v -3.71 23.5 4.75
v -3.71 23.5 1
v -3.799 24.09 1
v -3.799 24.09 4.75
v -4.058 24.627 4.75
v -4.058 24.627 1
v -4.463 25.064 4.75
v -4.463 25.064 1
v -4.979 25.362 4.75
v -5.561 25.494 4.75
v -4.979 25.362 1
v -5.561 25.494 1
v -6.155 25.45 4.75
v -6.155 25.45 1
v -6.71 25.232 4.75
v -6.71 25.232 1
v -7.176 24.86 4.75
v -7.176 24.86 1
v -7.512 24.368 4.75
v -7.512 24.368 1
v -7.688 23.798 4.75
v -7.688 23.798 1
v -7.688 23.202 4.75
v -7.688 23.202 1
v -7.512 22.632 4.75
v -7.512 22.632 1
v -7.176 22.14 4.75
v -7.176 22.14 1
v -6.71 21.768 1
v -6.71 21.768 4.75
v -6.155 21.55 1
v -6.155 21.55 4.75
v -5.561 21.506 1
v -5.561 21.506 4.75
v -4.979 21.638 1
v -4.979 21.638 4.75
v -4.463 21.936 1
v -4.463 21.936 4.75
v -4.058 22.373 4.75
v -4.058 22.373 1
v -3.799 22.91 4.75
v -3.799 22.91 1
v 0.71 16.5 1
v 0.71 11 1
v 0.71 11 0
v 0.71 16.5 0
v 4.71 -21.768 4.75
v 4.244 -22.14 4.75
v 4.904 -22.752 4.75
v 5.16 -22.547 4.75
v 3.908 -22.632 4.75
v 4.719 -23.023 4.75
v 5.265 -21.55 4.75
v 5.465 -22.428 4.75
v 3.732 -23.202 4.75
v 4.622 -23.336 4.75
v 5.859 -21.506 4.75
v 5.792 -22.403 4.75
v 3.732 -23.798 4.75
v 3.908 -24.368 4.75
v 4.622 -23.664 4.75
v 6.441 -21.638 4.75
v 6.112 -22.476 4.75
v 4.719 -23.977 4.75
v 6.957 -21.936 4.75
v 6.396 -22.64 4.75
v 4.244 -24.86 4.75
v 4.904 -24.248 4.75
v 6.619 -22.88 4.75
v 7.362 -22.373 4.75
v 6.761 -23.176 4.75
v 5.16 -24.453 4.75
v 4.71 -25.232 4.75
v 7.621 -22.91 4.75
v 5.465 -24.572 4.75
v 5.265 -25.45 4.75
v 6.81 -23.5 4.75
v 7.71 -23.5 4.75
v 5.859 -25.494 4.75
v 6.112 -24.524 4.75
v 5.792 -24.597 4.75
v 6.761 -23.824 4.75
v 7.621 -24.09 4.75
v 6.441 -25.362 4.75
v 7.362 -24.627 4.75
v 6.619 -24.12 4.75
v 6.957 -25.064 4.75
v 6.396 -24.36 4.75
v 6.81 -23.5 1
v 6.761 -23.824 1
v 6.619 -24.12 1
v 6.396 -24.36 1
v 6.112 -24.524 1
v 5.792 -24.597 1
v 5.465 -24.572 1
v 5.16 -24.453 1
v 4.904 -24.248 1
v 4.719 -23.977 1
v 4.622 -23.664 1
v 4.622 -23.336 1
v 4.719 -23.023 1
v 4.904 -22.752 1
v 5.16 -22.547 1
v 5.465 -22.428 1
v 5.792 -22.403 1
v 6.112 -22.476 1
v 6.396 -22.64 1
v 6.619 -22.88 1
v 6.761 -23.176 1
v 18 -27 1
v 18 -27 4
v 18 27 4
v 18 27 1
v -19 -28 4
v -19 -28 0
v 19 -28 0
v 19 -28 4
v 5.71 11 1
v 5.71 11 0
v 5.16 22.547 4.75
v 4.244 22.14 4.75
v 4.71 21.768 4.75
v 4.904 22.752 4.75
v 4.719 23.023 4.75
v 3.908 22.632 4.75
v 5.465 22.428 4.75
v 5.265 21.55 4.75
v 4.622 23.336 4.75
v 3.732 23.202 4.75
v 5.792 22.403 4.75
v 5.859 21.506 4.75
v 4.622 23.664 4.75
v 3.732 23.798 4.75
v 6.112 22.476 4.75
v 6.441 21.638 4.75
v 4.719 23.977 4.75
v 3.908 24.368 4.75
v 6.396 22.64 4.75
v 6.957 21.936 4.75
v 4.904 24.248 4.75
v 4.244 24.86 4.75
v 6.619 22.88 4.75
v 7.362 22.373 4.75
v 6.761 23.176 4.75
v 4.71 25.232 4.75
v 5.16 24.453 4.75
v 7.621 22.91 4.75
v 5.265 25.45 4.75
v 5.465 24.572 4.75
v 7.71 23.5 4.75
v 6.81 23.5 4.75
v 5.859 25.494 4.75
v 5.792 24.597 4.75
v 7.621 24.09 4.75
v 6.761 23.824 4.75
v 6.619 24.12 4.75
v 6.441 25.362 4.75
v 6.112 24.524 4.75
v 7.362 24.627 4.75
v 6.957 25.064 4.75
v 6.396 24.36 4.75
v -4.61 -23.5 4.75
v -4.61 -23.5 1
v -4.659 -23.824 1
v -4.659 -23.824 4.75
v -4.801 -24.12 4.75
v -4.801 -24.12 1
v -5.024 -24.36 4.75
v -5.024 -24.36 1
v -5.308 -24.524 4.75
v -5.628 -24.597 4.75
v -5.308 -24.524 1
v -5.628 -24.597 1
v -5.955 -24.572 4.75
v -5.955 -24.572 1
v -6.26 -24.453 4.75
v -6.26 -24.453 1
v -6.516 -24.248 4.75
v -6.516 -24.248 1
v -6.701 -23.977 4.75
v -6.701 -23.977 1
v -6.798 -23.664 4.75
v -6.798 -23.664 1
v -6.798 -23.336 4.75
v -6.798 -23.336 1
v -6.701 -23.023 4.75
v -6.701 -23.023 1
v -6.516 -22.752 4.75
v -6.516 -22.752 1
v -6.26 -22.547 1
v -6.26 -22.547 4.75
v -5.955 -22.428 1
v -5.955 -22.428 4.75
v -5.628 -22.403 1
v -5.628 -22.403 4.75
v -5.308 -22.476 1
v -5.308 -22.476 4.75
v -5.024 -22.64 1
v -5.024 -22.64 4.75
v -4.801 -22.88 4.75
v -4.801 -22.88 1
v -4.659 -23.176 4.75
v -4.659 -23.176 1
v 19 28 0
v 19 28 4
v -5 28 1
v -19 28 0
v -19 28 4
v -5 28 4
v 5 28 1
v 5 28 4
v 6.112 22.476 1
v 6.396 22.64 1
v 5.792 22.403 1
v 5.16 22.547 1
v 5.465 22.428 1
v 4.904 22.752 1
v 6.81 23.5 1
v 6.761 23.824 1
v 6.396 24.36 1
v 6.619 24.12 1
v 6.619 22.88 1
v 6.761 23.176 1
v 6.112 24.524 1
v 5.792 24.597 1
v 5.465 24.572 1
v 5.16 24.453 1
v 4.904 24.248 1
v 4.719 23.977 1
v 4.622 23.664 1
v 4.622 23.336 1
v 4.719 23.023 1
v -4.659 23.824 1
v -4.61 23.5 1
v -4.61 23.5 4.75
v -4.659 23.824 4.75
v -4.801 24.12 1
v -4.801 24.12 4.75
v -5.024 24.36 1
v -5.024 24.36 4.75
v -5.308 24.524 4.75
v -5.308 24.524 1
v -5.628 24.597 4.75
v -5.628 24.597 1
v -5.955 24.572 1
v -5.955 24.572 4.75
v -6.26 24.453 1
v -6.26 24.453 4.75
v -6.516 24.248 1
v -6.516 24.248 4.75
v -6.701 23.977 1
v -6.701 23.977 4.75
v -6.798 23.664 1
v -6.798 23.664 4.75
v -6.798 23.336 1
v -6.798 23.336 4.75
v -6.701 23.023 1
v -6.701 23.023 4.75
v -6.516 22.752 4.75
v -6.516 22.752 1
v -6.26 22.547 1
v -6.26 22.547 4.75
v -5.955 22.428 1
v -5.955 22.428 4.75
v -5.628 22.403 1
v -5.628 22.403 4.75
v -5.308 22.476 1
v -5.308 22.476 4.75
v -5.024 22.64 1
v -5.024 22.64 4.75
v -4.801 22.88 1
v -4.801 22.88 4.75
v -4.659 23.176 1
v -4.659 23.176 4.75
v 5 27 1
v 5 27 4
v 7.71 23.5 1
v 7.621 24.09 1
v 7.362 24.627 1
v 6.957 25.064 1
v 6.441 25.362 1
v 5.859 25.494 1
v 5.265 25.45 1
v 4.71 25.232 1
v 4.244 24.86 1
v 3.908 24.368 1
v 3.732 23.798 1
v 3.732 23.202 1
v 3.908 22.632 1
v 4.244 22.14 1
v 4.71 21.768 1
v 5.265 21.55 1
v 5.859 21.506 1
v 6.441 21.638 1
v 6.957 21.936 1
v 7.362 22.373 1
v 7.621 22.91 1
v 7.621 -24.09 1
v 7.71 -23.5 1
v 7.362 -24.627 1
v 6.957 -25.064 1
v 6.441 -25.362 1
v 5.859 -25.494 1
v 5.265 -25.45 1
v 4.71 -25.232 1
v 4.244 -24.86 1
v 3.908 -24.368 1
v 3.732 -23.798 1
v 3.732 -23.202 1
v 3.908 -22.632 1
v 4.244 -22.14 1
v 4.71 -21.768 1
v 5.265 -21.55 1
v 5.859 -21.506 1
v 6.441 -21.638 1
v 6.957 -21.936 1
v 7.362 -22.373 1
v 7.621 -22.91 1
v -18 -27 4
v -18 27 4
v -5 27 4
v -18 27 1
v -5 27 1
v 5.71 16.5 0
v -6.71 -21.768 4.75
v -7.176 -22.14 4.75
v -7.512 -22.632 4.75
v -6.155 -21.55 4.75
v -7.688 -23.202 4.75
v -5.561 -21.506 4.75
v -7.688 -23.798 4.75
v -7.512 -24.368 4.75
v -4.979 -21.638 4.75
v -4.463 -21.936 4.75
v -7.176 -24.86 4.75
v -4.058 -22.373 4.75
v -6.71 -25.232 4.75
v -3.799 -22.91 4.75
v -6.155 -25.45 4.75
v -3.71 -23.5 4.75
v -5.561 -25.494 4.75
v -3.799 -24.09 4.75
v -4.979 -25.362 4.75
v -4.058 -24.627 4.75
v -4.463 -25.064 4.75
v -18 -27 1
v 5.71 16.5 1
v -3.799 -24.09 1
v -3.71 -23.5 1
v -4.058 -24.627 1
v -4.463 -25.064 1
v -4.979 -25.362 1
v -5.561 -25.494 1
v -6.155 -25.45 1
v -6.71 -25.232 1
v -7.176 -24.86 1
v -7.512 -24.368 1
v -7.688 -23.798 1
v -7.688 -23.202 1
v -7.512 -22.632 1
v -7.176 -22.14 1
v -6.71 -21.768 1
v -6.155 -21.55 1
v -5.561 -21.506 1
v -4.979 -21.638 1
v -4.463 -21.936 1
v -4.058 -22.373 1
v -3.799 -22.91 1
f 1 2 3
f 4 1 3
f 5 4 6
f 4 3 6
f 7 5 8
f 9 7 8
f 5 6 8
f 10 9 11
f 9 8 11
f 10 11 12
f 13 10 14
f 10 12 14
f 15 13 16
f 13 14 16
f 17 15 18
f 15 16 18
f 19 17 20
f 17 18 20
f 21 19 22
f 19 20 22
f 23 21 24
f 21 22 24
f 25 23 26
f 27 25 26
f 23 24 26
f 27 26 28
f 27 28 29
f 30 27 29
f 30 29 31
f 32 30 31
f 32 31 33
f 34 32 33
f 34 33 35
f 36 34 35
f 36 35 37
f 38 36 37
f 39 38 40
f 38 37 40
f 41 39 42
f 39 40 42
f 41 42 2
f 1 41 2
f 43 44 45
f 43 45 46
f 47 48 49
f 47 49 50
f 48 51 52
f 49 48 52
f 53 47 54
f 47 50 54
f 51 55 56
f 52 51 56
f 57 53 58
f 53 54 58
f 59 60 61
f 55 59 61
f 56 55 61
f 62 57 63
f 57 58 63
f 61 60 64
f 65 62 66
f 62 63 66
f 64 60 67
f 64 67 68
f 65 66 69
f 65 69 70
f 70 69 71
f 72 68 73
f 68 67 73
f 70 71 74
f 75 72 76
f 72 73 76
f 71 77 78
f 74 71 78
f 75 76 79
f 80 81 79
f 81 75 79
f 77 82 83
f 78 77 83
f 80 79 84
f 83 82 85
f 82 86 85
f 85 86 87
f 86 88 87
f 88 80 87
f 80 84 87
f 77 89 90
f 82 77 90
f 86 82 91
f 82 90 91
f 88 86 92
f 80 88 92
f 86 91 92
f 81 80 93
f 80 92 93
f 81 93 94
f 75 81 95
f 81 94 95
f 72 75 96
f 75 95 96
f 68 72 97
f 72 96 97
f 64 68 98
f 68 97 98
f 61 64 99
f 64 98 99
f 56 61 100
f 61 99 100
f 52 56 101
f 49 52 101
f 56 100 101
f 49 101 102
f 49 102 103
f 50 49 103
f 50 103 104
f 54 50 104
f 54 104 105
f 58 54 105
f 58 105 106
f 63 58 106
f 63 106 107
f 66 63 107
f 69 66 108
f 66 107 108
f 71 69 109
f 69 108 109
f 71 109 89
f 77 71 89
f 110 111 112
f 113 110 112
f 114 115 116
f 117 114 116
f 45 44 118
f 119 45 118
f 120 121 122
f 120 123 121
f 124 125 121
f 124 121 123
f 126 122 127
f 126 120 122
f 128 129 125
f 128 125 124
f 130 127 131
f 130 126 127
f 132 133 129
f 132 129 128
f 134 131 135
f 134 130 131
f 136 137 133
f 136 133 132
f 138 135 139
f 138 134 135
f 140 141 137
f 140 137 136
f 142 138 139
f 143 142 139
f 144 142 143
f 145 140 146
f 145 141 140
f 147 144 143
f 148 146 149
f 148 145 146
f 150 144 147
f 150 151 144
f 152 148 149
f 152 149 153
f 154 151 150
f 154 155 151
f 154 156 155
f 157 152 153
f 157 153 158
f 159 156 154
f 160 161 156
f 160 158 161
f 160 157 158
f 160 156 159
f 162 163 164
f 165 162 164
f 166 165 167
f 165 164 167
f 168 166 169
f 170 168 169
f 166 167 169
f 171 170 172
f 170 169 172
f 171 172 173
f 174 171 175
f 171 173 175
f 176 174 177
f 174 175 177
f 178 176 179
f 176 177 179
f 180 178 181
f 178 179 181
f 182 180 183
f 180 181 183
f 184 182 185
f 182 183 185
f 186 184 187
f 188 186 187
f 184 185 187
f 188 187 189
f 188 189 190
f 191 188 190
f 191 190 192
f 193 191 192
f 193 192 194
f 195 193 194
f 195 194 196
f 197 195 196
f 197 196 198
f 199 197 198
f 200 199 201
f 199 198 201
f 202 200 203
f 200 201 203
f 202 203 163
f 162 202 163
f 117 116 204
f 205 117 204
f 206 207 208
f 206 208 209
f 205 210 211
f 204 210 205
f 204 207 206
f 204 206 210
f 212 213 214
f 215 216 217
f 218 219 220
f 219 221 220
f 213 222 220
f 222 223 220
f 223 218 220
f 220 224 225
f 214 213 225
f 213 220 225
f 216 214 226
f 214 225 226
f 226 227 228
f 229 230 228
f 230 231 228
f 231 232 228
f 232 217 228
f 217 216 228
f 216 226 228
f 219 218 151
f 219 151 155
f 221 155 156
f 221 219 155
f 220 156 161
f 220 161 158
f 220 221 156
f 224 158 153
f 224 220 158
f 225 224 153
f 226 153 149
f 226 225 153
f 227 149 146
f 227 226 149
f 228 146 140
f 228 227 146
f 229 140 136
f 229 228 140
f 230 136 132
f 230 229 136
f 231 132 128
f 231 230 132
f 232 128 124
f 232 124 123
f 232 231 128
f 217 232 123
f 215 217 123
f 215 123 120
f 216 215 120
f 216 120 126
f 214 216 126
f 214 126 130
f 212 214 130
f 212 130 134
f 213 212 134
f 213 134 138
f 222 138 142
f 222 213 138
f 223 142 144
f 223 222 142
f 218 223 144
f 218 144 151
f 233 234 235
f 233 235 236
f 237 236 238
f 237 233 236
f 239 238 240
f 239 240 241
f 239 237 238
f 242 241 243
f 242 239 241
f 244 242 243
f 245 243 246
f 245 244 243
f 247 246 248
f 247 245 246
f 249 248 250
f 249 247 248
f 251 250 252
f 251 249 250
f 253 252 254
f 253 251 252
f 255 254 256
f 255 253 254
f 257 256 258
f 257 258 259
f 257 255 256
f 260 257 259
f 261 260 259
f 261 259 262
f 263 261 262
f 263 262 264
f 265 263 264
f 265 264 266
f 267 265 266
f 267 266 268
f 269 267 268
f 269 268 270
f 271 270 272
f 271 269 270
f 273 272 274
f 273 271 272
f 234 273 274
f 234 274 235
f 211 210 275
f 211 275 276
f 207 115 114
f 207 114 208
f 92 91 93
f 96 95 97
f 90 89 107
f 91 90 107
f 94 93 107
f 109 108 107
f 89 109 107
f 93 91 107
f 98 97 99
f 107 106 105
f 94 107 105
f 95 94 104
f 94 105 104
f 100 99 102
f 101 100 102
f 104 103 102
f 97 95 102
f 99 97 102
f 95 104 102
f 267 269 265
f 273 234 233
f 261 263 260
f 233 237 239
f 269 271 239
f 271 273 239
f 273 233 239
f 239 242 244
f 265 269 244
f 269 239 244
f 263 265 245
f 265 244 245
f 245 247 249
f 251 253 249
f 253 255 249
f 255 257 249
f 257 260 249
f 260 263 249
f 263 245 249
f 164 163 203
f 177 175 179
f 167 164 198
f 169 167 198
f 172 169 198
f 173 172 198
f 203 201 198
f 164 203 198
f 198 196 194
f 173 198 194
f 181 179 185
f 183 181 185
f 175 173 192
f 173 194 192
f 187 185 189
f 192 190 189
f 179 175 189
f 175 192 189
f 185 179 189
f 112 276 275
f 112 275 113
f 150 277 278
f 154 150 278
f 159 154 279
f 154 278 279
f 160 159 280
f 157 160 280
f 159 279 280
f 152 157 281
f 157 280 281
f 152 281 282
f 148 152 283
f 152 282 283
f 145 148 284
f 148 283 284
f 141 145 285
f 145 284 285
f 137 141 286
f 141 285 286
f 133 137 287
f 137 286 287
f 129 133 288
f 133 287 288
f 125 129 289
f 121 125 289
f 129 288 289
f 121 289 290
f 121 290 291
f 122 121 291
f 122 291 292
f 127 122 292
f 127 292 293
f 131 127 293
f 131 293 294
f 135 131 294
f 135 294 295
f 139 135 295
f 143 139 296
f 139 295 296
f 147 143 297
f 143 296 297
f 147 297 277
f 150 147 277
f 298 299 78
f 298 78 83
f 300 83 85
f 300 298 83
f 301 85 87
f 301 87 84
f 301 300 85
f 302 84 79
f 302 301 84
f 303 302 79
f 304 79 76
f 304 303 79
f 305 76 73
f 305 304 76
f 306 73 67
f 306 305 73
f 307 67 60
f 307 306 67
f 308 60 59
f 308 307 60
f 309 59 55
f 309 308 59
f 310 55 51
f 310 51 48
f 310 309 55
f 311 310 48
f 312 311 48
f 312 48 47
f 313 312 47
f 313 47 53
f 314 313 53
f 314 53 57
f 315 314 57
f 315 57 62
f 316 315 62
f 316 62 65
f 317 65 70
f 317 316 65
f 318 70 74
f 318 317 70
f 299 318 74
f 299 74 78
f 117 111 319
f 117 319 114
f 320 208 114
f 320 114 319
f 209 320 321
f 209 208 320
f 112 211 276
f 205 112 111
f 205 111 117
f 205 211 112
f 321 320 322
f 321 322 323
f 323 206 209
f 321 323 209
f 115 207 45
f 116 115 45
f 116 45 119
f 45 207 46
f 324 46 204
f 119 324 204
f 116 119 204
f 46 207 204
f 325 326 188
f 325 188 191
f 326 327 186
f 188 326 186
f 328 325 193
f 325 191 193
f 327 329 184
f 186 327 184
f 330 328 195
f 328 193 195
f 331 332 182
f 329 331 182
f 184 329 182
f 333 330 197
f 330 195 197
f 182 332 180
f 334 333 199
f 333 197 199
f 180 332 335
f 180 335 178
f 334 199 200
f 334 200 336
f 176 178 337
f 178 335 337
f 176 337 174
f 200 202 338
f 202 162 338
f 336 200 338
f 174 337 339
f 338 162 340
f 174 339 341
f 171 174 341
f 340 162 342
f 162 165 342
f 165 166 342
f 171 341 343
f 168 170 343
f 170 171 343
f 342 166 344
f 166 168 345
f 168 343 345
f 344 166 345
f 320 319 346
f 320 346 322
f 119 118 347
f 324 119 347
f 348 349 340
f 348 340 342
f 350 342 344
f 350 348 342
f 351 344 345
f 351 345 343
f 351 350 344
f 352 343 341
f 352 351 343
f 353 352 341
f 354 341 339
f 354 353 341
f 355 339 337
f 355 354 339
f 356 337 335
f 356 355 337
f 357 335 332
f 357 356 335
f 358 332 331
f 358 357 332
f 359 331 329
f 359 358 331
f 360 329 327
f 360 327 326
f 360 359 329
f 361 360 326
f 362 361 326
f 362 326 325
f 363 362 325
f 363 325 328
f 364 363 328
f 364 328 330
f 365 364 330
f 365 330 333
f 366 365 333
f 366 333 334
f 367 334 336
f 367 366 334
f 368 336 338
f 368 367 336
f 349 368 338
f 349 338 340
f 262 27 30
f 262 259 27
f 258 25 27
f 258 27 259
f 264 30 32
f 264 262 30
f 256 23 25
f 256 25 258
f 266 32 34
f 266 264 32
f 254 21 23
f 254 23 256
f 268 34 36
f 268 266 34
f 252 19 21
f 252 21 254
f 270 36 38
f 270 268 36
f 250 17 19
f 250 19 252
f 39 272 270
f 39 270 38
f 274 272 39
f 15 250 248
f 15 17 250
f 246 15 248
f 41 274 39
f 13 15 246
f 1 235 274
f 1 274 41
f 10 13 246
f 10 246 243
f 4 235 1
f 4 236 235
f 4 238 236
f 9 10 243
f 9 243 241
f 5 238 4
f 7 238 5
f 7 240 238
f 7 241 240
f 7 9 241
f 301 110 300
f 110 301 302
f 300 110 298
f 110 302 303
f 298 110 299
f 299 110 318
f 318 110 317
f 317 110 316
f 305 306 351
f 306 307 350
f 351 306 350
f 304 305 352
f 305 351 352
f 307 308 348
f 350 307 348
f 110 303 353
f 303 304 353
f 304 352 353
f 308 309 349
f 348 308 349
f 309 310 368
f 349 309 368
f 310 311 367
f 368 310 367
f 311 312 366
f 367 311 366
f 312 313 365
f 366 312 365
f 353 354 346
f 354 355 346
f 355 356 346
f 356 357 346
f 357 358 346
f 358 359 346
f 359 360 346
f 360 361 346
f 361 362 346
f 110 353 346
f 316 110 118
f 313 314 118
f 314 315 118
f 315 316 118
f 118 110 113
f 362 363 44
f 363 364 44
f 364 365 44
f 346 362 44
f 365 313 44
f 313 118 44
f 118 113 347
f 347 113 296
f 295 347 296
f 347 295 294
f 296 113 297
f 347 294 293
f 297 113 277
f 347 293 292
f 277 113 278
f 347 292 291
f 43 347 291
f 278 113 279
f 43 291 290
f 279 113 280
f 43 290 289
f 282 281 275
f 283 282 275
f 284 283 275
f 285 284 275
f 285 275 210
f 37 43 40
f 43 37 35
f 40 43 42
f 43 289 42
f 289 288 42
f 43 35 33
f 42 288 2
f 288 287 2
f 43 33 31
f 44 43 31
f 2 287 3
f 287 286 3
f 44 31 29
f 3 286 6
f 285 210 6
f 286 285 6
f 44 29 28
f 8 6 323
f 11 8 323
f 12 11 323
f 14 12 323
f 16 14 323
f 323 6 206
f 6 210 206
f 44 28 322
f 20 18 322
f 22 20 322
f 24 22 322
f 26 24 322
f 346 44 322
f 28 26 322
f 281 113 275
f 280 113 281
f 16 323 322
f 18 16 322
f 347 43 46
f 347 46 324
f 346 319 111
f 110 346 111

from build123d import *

# Parameters (mm, degrees)
SKETCH034_W     = 38
SKETCH034_H     = 56
PAD020_DEPTH    = 4
SKETCH035_W     = 36
SKETCH035_H     = 54
POCKET008_DEPTH = 3
SKETCH036_W     = 10
SKETCH036_H     = 3
POCKET009_DEPTH = 5
SKETCH037_R     = 2
SKETCH037_R_2   = 1.1
PAD021_DEPTH    = 3.75
SKETCH039_W     = 5
SKETCH039_H     = 5.5
POCKET011_DEPTH = 5


with BuildPart() as part:
    # Sketch034 → Pad020 (new body)
    with BuildSketch(Plane.XY):
        Rectangle(SKETCH034_W, SKETCH034_H)
    extrude(amount=PAD020_DEPTH)

    # Sketch035 (on Face6 of Pad020) → Pocket008 (cut)
    with BuildSketch(Plane.XY.offset(4)):
        Rectangle(SKETCH035_W, SKETCH035_H)
    extrude(amount=-POCKET008_DEPTH, mode=Mode.SUBTRACT)

    # Sketch036 (on Face1 of Pocket008) → Pocket009 (cut)
    with BuildSketch(Plane(origin=(0, 28, 0), x_dir=(-1, 0, 0), z_dir=(0, 1, 0))):
        with Locations((0, 2.5)):
            Rectangle(SKETCH036_W, SKETCH036_H)
    extrude(amount=-POCKET009_DEPTH, mode=Mode.SUBTRACT)

    # Sketch037 (on Face14 of Pocket009) → Pad021 (join)
    with BuildSketch(Plane.XY.offset(1)):
        with Locations((-5.71, 23.5)):
            Circle(SKETCH037_R)
        with Locations((-5.71, 23.5)):
            Circle(SKETCH037_R_2, mode=Mode.SUBTRACT)
        with Locations((5.71, 23.5)):
            Circle(SKETCH037_R)
        with Locations((5.71, 23.5)):
            Circle(SKETCH037_R_2, mode=Mode.SUBTRACT)
    pad021 = extrude(amount=PAD021_DEPTH)

    # Mirrored010: Pad021 across XZ
    add(pad021.mirror(Plane.XZ))

    # Sketch039 (on Face6 of Mirrored010) → Pocket011 (cut)
    with BuildSketch(Plane.XY.offset(1)):
        with Locations((3.21, 13.75)):
            Rectangle(SKETCH039_W, SKETCH039_H)
    extrude(amount=-POCKET011_DEPTH, mode=Mode.SUBTRACT)


solid = part.part
